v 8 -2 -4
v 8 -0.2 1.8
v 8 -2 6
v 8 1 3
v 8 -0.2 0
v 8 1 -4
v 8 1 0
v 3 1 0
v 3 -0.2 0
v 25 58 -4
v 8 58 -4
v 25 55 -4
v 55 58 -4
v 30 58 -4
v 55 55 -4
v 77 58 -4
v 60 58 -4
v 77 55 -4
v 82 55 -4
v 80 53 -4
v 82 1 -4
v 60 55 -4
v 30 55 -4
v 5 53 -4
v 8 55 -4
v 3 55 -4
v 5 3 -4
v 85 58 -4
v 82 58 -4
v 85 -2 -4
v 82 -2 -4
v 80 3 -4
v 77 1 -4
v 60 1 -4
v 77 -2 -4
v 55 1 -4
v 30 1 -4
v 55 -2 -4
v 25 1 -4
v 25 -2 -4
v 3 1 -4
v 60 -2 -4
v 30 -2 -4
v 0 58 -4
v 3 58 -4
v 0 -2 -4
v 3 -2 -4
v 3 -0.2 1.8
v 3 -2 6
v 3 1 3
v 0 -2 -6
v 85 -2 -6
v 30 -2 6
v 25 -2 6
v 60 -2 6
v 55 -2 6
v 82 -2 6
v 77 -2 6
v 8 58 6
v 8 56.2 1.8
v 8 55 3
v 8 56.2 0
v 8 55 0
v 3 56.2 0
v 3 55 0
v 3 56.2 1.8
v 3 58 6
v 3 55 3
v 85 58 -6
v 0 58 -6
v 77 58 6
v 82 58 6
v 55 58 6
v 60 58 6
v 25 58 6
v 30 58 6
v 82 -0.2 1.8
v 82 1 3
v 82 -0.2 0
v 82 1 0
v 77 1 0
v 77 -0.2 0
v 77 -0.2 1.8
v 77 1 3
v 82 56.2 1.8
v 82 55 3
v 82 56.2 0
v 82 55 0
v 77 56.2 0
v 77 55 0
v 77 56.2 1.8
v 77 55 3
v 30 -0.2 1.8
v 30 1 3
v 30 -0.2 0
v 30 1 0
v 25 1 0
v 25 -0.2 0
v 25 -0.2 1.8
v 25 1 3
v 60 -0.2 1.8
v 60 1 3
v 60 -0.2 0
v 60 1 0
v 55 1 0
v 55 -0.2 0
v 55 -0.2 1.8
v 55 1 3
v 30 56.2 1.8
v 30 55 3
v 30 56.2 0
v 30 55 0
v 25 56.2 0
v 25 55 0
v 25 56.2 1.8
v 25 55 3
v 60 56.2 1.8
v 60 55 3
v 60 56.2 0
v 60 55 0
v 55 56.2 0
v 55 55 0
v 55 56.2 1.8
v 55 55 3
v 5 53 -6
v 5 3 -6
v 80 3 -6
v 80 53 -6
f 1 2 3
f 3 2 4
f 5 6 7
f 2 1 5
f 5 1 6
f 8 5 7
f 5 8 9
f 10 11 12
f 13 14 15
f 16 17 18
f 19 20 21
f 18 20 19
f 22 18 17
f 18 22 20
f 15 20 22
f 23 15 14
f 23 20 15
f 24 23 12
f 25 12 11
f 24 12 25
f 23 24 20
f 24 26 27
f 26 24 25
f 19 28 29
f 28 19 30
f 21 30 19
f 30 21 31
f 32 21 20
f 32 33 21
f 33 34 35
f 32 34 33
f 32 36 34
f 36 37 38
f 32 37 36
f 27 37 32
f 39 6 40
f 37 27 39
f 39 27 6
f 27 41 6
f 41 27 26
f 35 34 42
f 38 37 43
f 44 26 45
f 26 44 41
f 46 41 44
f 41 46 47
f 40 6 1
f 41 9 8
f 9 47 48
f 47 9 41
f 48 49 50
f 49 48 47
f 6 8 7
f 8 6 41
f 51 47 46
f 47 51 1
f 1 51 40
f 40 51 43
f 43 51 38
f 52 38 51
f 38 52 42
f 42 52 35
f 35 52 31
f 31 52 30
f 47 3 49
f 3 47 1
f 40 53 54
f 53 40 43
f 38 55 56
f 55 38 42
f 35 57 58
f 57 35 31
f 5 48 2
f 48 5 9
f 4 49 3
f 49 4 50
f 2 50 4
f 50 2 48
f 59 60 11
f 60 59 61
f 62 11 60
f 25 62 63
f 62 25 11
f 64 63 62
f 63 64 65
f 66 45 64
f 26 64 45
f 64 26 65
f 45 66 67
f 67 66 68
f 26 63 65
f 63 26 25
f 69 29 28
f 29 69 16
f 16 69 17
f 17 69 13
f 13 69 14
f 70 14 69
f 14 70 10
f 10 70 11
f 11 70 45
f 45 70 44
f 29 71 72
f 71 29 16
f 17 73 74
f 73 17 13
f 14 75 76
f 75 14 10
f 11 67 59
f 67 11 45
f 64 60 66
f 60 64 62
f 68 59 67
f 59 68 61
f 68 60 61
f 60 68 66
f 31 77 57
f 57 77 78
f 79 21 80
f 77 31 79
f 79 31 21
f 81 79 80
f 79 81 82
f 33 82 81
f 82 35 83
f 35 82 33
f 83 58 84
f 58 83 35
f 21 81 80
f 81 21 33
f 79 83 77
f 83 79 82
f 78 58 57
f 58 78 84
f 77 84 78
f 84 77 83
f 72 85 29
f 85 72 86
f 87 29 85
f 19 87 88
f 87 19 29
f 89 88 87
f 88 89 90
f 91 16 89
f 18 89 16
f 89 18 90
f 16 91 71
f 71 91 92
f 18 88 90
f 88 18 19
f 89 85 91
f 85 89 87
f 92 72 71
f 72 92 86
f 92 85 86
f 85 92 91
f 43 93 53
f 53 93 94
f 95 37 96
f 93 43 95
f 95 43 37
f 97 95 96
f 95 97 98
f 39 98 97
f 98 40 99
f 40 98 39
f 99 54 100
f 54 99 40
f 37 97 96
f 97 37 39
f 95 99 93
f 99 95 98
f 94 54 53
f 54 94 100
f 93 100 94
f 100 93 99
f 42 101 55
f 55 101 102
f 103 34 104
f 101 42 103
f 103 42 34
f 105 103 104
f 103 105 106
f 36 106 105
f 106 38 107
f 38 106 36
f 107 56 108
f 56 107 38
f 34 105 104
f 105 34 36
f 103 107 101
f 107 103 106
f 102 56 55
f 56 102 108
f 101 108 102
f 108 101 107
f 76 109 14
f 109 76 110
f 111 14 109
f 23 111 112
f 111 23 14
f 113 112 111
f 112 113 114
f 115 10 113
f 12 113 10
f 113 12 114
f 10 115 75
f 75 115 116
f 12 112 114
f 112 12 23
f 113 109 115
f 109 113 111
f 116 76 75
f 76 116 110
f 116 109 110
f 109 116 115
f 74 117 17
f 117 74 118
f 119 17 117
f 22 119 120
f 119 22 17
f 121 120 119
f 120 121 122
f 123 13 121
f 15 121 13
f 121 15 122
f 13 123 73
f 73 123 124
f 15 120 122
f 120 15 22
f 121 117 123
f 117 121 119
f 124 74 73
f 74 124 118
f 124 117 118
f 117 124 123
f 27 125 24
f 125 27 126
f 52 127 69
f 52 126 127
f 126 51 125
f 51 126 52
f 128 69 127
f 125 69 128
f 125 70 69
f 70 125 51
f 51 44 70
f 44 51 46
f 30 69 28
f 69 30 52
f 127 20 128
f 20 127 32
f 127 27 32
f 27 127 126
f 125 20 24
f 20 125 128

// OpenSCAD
small = 0.1;
peg_bite  =  1.0;
bite_extra = 0.2;  // extra clearance for edge of board
peg_gap   =  2.0;
peg_width =  5.0;
peg_depth =  3.0;
peg_sep   =  56 - 2;
peg_raise =  4.0;

board_x = 85.0;
board_y = 56.0;
board_z =  1.1;

//   _
//  | \
//  |  \
//  |   \
//  |  /
//  |  |
//  |  o-|  <- origin
//  |    |
//  |    |
//  ------
module peg()
{
  extra = 1;

  translate([0, -peg_depth+peg_bite,-peg_raise])
  {
    cube([peg_width,peg_depth,peg_raise], center=false);
  }

  translate([0, -peg_depth+peg_bite,0])
  {
    cube([peg_width,peg_depth-peg_bite-bite_extra,peg_gap+peg_bite+peg_bite], center=false);
  }

  translate([0,-peg_depth+peg_bite+extra-extra,peg_gap])
  {
    //cube([peg_width,peg_depth-peg_bite-extra,peg_bite+extra], center=false);
  }

  peg_dxy = peg_depth;
  polyhedron(
    points = [
      [0, peg_bite, peg_gap+peg_bite],
      [0, peg_bite-peg_dxy, peg_gap+peg_bite-peg_dxy],
      [0, peg_bite-peg_dxy, peg_gap+peg_bite+peg_dxy],
      [peg_width, peg_bite, peg_gap+peg_bite],
      [peg_width, peg_bite-peg_dxy, peg_gap+peg_bite-peg_dxy],
      [peg_width, peg_bite-peg_dxy, peg_gap+peg_bite+peg_dxy],
    ],
    triangles = [ 
      [0,2,1],  // right
      [3,4,5],  // left
      [0,3,2],  // top
      [2,3,5],
      [1,2,4],  // back
      [4,2,5],
      [0,1,3],  // bottom
      [3,1,4]
    ]
  );
}

module front_peg(x)
{
  translate([x,0,0]) 
  {
    peg();
  }
}

module back_peg(x)
{
  translate([x,board_y,0])
  {
    mirror([0,1,0])
    {
      peg();
    }
  }
}


module board()
{
  color([0,1,0]) {
    cube([board_x,board_y,board_z],center=false);
  }
  // ethernet block
  large = 10;
  translate([-1,38,board_z]) 
  {
    cube([21,16.5,14.0]);
    translate([-10.0+small,0,0]) cube([10.0,16.5,14]);  // clearance volume - keep clear
    translate([-10.0,0,0]) cube([10.0+large,16.5,15+2]);  // extra clearance above to height of usb
  }

  // usb block
  translate([0,18,board_z]) 
  {
    translate([-7.5,0,1]) cube([18,14,16]);
    translate([-3,2,0]) cube([13,10,1+small]);
  }

  // hdmi block
  translate([board_x-5.0,44.0,board_z])
  {
    cube([6.0,9.0,4.0]);
    translate([6.0-small,0,0]) cube([10.0,9.0,4.0]);  // clearance volume - keep clear
  }

  // SD Card clearance
  translate([board_x-small,14.0,-3.5])
  {
    difference()
    {
      cube([17.0+small, 25.0, 3.0]);  // clearance volume - keep clear
      translate([-small,10.0,-small]) cube([17.0+small*3,5.0,3+small*2]);
    }
  }

  // audio connector
  translate([13.5, 0, 4.4]) {
    cube([12.0,11.0, 6.5]);
    translate([6.0,0.0,3.25]) rotate([90,0,0]) cylinder(h=4, r=6.5/2);
    translate([6.0,-4+small,3.25]) rotate([90,0,0]) cylinder(h=10, r=6.5/2);  // clearance volume
  }

  // video connector
  translate([33.0,3.0,board_z]) {
    cube([10.0,10.0,13.0]);
    translate([5,0,7.5]) rotate([90,0,0]) cylinder(h=9,r=8.5/2);
    translate([5,0,7.5]) rotate([90,0,0]) cylinder(h=19,r=10.0/2);
  }
}

module pair()
{
  foot_height = 2.0;
  foot_x = peg_width;
  foot_y = board_y + (peg_depth-peg_bite) * 2;
  translate([0,-peg_depth+peg_bite,-peg_raise-foot_height])
  {
    cube([foot_x,foot_y,foot_height],center=false);
  }
}

module pibase()
{
  front_peg(3.0);
  back_peg(3.0);
  front_peg(board_x-peg_width-3.0);
  back_peg(board_x-peg_width-3.0);

  pair();
  translate([board_x-peg_width,0,0])
  {
    pair();
  }

  // more pegs

  front_peg(25.0);
  front_peg(board_x-25.0-peg_width);
  back_peg(25.0);
  back_peg(board_x-25.0-peg_width);


  peg3_offet = 25.0;
  
  
  spar_width = peg_width;
  spar_height = 2.0;
  translate([0,-peg_depth+peg_bite,-peg_raise-spar_height]) {
    cube([board_x, spar_width, spar_height]);
  }
  translate([0,board_y-spar_width+peg_depth-peg_bite,-peg_raise-spar_height]) {
    cube([board_x, spar_width, spar_height]);
  }
}

pibase();
%board();
